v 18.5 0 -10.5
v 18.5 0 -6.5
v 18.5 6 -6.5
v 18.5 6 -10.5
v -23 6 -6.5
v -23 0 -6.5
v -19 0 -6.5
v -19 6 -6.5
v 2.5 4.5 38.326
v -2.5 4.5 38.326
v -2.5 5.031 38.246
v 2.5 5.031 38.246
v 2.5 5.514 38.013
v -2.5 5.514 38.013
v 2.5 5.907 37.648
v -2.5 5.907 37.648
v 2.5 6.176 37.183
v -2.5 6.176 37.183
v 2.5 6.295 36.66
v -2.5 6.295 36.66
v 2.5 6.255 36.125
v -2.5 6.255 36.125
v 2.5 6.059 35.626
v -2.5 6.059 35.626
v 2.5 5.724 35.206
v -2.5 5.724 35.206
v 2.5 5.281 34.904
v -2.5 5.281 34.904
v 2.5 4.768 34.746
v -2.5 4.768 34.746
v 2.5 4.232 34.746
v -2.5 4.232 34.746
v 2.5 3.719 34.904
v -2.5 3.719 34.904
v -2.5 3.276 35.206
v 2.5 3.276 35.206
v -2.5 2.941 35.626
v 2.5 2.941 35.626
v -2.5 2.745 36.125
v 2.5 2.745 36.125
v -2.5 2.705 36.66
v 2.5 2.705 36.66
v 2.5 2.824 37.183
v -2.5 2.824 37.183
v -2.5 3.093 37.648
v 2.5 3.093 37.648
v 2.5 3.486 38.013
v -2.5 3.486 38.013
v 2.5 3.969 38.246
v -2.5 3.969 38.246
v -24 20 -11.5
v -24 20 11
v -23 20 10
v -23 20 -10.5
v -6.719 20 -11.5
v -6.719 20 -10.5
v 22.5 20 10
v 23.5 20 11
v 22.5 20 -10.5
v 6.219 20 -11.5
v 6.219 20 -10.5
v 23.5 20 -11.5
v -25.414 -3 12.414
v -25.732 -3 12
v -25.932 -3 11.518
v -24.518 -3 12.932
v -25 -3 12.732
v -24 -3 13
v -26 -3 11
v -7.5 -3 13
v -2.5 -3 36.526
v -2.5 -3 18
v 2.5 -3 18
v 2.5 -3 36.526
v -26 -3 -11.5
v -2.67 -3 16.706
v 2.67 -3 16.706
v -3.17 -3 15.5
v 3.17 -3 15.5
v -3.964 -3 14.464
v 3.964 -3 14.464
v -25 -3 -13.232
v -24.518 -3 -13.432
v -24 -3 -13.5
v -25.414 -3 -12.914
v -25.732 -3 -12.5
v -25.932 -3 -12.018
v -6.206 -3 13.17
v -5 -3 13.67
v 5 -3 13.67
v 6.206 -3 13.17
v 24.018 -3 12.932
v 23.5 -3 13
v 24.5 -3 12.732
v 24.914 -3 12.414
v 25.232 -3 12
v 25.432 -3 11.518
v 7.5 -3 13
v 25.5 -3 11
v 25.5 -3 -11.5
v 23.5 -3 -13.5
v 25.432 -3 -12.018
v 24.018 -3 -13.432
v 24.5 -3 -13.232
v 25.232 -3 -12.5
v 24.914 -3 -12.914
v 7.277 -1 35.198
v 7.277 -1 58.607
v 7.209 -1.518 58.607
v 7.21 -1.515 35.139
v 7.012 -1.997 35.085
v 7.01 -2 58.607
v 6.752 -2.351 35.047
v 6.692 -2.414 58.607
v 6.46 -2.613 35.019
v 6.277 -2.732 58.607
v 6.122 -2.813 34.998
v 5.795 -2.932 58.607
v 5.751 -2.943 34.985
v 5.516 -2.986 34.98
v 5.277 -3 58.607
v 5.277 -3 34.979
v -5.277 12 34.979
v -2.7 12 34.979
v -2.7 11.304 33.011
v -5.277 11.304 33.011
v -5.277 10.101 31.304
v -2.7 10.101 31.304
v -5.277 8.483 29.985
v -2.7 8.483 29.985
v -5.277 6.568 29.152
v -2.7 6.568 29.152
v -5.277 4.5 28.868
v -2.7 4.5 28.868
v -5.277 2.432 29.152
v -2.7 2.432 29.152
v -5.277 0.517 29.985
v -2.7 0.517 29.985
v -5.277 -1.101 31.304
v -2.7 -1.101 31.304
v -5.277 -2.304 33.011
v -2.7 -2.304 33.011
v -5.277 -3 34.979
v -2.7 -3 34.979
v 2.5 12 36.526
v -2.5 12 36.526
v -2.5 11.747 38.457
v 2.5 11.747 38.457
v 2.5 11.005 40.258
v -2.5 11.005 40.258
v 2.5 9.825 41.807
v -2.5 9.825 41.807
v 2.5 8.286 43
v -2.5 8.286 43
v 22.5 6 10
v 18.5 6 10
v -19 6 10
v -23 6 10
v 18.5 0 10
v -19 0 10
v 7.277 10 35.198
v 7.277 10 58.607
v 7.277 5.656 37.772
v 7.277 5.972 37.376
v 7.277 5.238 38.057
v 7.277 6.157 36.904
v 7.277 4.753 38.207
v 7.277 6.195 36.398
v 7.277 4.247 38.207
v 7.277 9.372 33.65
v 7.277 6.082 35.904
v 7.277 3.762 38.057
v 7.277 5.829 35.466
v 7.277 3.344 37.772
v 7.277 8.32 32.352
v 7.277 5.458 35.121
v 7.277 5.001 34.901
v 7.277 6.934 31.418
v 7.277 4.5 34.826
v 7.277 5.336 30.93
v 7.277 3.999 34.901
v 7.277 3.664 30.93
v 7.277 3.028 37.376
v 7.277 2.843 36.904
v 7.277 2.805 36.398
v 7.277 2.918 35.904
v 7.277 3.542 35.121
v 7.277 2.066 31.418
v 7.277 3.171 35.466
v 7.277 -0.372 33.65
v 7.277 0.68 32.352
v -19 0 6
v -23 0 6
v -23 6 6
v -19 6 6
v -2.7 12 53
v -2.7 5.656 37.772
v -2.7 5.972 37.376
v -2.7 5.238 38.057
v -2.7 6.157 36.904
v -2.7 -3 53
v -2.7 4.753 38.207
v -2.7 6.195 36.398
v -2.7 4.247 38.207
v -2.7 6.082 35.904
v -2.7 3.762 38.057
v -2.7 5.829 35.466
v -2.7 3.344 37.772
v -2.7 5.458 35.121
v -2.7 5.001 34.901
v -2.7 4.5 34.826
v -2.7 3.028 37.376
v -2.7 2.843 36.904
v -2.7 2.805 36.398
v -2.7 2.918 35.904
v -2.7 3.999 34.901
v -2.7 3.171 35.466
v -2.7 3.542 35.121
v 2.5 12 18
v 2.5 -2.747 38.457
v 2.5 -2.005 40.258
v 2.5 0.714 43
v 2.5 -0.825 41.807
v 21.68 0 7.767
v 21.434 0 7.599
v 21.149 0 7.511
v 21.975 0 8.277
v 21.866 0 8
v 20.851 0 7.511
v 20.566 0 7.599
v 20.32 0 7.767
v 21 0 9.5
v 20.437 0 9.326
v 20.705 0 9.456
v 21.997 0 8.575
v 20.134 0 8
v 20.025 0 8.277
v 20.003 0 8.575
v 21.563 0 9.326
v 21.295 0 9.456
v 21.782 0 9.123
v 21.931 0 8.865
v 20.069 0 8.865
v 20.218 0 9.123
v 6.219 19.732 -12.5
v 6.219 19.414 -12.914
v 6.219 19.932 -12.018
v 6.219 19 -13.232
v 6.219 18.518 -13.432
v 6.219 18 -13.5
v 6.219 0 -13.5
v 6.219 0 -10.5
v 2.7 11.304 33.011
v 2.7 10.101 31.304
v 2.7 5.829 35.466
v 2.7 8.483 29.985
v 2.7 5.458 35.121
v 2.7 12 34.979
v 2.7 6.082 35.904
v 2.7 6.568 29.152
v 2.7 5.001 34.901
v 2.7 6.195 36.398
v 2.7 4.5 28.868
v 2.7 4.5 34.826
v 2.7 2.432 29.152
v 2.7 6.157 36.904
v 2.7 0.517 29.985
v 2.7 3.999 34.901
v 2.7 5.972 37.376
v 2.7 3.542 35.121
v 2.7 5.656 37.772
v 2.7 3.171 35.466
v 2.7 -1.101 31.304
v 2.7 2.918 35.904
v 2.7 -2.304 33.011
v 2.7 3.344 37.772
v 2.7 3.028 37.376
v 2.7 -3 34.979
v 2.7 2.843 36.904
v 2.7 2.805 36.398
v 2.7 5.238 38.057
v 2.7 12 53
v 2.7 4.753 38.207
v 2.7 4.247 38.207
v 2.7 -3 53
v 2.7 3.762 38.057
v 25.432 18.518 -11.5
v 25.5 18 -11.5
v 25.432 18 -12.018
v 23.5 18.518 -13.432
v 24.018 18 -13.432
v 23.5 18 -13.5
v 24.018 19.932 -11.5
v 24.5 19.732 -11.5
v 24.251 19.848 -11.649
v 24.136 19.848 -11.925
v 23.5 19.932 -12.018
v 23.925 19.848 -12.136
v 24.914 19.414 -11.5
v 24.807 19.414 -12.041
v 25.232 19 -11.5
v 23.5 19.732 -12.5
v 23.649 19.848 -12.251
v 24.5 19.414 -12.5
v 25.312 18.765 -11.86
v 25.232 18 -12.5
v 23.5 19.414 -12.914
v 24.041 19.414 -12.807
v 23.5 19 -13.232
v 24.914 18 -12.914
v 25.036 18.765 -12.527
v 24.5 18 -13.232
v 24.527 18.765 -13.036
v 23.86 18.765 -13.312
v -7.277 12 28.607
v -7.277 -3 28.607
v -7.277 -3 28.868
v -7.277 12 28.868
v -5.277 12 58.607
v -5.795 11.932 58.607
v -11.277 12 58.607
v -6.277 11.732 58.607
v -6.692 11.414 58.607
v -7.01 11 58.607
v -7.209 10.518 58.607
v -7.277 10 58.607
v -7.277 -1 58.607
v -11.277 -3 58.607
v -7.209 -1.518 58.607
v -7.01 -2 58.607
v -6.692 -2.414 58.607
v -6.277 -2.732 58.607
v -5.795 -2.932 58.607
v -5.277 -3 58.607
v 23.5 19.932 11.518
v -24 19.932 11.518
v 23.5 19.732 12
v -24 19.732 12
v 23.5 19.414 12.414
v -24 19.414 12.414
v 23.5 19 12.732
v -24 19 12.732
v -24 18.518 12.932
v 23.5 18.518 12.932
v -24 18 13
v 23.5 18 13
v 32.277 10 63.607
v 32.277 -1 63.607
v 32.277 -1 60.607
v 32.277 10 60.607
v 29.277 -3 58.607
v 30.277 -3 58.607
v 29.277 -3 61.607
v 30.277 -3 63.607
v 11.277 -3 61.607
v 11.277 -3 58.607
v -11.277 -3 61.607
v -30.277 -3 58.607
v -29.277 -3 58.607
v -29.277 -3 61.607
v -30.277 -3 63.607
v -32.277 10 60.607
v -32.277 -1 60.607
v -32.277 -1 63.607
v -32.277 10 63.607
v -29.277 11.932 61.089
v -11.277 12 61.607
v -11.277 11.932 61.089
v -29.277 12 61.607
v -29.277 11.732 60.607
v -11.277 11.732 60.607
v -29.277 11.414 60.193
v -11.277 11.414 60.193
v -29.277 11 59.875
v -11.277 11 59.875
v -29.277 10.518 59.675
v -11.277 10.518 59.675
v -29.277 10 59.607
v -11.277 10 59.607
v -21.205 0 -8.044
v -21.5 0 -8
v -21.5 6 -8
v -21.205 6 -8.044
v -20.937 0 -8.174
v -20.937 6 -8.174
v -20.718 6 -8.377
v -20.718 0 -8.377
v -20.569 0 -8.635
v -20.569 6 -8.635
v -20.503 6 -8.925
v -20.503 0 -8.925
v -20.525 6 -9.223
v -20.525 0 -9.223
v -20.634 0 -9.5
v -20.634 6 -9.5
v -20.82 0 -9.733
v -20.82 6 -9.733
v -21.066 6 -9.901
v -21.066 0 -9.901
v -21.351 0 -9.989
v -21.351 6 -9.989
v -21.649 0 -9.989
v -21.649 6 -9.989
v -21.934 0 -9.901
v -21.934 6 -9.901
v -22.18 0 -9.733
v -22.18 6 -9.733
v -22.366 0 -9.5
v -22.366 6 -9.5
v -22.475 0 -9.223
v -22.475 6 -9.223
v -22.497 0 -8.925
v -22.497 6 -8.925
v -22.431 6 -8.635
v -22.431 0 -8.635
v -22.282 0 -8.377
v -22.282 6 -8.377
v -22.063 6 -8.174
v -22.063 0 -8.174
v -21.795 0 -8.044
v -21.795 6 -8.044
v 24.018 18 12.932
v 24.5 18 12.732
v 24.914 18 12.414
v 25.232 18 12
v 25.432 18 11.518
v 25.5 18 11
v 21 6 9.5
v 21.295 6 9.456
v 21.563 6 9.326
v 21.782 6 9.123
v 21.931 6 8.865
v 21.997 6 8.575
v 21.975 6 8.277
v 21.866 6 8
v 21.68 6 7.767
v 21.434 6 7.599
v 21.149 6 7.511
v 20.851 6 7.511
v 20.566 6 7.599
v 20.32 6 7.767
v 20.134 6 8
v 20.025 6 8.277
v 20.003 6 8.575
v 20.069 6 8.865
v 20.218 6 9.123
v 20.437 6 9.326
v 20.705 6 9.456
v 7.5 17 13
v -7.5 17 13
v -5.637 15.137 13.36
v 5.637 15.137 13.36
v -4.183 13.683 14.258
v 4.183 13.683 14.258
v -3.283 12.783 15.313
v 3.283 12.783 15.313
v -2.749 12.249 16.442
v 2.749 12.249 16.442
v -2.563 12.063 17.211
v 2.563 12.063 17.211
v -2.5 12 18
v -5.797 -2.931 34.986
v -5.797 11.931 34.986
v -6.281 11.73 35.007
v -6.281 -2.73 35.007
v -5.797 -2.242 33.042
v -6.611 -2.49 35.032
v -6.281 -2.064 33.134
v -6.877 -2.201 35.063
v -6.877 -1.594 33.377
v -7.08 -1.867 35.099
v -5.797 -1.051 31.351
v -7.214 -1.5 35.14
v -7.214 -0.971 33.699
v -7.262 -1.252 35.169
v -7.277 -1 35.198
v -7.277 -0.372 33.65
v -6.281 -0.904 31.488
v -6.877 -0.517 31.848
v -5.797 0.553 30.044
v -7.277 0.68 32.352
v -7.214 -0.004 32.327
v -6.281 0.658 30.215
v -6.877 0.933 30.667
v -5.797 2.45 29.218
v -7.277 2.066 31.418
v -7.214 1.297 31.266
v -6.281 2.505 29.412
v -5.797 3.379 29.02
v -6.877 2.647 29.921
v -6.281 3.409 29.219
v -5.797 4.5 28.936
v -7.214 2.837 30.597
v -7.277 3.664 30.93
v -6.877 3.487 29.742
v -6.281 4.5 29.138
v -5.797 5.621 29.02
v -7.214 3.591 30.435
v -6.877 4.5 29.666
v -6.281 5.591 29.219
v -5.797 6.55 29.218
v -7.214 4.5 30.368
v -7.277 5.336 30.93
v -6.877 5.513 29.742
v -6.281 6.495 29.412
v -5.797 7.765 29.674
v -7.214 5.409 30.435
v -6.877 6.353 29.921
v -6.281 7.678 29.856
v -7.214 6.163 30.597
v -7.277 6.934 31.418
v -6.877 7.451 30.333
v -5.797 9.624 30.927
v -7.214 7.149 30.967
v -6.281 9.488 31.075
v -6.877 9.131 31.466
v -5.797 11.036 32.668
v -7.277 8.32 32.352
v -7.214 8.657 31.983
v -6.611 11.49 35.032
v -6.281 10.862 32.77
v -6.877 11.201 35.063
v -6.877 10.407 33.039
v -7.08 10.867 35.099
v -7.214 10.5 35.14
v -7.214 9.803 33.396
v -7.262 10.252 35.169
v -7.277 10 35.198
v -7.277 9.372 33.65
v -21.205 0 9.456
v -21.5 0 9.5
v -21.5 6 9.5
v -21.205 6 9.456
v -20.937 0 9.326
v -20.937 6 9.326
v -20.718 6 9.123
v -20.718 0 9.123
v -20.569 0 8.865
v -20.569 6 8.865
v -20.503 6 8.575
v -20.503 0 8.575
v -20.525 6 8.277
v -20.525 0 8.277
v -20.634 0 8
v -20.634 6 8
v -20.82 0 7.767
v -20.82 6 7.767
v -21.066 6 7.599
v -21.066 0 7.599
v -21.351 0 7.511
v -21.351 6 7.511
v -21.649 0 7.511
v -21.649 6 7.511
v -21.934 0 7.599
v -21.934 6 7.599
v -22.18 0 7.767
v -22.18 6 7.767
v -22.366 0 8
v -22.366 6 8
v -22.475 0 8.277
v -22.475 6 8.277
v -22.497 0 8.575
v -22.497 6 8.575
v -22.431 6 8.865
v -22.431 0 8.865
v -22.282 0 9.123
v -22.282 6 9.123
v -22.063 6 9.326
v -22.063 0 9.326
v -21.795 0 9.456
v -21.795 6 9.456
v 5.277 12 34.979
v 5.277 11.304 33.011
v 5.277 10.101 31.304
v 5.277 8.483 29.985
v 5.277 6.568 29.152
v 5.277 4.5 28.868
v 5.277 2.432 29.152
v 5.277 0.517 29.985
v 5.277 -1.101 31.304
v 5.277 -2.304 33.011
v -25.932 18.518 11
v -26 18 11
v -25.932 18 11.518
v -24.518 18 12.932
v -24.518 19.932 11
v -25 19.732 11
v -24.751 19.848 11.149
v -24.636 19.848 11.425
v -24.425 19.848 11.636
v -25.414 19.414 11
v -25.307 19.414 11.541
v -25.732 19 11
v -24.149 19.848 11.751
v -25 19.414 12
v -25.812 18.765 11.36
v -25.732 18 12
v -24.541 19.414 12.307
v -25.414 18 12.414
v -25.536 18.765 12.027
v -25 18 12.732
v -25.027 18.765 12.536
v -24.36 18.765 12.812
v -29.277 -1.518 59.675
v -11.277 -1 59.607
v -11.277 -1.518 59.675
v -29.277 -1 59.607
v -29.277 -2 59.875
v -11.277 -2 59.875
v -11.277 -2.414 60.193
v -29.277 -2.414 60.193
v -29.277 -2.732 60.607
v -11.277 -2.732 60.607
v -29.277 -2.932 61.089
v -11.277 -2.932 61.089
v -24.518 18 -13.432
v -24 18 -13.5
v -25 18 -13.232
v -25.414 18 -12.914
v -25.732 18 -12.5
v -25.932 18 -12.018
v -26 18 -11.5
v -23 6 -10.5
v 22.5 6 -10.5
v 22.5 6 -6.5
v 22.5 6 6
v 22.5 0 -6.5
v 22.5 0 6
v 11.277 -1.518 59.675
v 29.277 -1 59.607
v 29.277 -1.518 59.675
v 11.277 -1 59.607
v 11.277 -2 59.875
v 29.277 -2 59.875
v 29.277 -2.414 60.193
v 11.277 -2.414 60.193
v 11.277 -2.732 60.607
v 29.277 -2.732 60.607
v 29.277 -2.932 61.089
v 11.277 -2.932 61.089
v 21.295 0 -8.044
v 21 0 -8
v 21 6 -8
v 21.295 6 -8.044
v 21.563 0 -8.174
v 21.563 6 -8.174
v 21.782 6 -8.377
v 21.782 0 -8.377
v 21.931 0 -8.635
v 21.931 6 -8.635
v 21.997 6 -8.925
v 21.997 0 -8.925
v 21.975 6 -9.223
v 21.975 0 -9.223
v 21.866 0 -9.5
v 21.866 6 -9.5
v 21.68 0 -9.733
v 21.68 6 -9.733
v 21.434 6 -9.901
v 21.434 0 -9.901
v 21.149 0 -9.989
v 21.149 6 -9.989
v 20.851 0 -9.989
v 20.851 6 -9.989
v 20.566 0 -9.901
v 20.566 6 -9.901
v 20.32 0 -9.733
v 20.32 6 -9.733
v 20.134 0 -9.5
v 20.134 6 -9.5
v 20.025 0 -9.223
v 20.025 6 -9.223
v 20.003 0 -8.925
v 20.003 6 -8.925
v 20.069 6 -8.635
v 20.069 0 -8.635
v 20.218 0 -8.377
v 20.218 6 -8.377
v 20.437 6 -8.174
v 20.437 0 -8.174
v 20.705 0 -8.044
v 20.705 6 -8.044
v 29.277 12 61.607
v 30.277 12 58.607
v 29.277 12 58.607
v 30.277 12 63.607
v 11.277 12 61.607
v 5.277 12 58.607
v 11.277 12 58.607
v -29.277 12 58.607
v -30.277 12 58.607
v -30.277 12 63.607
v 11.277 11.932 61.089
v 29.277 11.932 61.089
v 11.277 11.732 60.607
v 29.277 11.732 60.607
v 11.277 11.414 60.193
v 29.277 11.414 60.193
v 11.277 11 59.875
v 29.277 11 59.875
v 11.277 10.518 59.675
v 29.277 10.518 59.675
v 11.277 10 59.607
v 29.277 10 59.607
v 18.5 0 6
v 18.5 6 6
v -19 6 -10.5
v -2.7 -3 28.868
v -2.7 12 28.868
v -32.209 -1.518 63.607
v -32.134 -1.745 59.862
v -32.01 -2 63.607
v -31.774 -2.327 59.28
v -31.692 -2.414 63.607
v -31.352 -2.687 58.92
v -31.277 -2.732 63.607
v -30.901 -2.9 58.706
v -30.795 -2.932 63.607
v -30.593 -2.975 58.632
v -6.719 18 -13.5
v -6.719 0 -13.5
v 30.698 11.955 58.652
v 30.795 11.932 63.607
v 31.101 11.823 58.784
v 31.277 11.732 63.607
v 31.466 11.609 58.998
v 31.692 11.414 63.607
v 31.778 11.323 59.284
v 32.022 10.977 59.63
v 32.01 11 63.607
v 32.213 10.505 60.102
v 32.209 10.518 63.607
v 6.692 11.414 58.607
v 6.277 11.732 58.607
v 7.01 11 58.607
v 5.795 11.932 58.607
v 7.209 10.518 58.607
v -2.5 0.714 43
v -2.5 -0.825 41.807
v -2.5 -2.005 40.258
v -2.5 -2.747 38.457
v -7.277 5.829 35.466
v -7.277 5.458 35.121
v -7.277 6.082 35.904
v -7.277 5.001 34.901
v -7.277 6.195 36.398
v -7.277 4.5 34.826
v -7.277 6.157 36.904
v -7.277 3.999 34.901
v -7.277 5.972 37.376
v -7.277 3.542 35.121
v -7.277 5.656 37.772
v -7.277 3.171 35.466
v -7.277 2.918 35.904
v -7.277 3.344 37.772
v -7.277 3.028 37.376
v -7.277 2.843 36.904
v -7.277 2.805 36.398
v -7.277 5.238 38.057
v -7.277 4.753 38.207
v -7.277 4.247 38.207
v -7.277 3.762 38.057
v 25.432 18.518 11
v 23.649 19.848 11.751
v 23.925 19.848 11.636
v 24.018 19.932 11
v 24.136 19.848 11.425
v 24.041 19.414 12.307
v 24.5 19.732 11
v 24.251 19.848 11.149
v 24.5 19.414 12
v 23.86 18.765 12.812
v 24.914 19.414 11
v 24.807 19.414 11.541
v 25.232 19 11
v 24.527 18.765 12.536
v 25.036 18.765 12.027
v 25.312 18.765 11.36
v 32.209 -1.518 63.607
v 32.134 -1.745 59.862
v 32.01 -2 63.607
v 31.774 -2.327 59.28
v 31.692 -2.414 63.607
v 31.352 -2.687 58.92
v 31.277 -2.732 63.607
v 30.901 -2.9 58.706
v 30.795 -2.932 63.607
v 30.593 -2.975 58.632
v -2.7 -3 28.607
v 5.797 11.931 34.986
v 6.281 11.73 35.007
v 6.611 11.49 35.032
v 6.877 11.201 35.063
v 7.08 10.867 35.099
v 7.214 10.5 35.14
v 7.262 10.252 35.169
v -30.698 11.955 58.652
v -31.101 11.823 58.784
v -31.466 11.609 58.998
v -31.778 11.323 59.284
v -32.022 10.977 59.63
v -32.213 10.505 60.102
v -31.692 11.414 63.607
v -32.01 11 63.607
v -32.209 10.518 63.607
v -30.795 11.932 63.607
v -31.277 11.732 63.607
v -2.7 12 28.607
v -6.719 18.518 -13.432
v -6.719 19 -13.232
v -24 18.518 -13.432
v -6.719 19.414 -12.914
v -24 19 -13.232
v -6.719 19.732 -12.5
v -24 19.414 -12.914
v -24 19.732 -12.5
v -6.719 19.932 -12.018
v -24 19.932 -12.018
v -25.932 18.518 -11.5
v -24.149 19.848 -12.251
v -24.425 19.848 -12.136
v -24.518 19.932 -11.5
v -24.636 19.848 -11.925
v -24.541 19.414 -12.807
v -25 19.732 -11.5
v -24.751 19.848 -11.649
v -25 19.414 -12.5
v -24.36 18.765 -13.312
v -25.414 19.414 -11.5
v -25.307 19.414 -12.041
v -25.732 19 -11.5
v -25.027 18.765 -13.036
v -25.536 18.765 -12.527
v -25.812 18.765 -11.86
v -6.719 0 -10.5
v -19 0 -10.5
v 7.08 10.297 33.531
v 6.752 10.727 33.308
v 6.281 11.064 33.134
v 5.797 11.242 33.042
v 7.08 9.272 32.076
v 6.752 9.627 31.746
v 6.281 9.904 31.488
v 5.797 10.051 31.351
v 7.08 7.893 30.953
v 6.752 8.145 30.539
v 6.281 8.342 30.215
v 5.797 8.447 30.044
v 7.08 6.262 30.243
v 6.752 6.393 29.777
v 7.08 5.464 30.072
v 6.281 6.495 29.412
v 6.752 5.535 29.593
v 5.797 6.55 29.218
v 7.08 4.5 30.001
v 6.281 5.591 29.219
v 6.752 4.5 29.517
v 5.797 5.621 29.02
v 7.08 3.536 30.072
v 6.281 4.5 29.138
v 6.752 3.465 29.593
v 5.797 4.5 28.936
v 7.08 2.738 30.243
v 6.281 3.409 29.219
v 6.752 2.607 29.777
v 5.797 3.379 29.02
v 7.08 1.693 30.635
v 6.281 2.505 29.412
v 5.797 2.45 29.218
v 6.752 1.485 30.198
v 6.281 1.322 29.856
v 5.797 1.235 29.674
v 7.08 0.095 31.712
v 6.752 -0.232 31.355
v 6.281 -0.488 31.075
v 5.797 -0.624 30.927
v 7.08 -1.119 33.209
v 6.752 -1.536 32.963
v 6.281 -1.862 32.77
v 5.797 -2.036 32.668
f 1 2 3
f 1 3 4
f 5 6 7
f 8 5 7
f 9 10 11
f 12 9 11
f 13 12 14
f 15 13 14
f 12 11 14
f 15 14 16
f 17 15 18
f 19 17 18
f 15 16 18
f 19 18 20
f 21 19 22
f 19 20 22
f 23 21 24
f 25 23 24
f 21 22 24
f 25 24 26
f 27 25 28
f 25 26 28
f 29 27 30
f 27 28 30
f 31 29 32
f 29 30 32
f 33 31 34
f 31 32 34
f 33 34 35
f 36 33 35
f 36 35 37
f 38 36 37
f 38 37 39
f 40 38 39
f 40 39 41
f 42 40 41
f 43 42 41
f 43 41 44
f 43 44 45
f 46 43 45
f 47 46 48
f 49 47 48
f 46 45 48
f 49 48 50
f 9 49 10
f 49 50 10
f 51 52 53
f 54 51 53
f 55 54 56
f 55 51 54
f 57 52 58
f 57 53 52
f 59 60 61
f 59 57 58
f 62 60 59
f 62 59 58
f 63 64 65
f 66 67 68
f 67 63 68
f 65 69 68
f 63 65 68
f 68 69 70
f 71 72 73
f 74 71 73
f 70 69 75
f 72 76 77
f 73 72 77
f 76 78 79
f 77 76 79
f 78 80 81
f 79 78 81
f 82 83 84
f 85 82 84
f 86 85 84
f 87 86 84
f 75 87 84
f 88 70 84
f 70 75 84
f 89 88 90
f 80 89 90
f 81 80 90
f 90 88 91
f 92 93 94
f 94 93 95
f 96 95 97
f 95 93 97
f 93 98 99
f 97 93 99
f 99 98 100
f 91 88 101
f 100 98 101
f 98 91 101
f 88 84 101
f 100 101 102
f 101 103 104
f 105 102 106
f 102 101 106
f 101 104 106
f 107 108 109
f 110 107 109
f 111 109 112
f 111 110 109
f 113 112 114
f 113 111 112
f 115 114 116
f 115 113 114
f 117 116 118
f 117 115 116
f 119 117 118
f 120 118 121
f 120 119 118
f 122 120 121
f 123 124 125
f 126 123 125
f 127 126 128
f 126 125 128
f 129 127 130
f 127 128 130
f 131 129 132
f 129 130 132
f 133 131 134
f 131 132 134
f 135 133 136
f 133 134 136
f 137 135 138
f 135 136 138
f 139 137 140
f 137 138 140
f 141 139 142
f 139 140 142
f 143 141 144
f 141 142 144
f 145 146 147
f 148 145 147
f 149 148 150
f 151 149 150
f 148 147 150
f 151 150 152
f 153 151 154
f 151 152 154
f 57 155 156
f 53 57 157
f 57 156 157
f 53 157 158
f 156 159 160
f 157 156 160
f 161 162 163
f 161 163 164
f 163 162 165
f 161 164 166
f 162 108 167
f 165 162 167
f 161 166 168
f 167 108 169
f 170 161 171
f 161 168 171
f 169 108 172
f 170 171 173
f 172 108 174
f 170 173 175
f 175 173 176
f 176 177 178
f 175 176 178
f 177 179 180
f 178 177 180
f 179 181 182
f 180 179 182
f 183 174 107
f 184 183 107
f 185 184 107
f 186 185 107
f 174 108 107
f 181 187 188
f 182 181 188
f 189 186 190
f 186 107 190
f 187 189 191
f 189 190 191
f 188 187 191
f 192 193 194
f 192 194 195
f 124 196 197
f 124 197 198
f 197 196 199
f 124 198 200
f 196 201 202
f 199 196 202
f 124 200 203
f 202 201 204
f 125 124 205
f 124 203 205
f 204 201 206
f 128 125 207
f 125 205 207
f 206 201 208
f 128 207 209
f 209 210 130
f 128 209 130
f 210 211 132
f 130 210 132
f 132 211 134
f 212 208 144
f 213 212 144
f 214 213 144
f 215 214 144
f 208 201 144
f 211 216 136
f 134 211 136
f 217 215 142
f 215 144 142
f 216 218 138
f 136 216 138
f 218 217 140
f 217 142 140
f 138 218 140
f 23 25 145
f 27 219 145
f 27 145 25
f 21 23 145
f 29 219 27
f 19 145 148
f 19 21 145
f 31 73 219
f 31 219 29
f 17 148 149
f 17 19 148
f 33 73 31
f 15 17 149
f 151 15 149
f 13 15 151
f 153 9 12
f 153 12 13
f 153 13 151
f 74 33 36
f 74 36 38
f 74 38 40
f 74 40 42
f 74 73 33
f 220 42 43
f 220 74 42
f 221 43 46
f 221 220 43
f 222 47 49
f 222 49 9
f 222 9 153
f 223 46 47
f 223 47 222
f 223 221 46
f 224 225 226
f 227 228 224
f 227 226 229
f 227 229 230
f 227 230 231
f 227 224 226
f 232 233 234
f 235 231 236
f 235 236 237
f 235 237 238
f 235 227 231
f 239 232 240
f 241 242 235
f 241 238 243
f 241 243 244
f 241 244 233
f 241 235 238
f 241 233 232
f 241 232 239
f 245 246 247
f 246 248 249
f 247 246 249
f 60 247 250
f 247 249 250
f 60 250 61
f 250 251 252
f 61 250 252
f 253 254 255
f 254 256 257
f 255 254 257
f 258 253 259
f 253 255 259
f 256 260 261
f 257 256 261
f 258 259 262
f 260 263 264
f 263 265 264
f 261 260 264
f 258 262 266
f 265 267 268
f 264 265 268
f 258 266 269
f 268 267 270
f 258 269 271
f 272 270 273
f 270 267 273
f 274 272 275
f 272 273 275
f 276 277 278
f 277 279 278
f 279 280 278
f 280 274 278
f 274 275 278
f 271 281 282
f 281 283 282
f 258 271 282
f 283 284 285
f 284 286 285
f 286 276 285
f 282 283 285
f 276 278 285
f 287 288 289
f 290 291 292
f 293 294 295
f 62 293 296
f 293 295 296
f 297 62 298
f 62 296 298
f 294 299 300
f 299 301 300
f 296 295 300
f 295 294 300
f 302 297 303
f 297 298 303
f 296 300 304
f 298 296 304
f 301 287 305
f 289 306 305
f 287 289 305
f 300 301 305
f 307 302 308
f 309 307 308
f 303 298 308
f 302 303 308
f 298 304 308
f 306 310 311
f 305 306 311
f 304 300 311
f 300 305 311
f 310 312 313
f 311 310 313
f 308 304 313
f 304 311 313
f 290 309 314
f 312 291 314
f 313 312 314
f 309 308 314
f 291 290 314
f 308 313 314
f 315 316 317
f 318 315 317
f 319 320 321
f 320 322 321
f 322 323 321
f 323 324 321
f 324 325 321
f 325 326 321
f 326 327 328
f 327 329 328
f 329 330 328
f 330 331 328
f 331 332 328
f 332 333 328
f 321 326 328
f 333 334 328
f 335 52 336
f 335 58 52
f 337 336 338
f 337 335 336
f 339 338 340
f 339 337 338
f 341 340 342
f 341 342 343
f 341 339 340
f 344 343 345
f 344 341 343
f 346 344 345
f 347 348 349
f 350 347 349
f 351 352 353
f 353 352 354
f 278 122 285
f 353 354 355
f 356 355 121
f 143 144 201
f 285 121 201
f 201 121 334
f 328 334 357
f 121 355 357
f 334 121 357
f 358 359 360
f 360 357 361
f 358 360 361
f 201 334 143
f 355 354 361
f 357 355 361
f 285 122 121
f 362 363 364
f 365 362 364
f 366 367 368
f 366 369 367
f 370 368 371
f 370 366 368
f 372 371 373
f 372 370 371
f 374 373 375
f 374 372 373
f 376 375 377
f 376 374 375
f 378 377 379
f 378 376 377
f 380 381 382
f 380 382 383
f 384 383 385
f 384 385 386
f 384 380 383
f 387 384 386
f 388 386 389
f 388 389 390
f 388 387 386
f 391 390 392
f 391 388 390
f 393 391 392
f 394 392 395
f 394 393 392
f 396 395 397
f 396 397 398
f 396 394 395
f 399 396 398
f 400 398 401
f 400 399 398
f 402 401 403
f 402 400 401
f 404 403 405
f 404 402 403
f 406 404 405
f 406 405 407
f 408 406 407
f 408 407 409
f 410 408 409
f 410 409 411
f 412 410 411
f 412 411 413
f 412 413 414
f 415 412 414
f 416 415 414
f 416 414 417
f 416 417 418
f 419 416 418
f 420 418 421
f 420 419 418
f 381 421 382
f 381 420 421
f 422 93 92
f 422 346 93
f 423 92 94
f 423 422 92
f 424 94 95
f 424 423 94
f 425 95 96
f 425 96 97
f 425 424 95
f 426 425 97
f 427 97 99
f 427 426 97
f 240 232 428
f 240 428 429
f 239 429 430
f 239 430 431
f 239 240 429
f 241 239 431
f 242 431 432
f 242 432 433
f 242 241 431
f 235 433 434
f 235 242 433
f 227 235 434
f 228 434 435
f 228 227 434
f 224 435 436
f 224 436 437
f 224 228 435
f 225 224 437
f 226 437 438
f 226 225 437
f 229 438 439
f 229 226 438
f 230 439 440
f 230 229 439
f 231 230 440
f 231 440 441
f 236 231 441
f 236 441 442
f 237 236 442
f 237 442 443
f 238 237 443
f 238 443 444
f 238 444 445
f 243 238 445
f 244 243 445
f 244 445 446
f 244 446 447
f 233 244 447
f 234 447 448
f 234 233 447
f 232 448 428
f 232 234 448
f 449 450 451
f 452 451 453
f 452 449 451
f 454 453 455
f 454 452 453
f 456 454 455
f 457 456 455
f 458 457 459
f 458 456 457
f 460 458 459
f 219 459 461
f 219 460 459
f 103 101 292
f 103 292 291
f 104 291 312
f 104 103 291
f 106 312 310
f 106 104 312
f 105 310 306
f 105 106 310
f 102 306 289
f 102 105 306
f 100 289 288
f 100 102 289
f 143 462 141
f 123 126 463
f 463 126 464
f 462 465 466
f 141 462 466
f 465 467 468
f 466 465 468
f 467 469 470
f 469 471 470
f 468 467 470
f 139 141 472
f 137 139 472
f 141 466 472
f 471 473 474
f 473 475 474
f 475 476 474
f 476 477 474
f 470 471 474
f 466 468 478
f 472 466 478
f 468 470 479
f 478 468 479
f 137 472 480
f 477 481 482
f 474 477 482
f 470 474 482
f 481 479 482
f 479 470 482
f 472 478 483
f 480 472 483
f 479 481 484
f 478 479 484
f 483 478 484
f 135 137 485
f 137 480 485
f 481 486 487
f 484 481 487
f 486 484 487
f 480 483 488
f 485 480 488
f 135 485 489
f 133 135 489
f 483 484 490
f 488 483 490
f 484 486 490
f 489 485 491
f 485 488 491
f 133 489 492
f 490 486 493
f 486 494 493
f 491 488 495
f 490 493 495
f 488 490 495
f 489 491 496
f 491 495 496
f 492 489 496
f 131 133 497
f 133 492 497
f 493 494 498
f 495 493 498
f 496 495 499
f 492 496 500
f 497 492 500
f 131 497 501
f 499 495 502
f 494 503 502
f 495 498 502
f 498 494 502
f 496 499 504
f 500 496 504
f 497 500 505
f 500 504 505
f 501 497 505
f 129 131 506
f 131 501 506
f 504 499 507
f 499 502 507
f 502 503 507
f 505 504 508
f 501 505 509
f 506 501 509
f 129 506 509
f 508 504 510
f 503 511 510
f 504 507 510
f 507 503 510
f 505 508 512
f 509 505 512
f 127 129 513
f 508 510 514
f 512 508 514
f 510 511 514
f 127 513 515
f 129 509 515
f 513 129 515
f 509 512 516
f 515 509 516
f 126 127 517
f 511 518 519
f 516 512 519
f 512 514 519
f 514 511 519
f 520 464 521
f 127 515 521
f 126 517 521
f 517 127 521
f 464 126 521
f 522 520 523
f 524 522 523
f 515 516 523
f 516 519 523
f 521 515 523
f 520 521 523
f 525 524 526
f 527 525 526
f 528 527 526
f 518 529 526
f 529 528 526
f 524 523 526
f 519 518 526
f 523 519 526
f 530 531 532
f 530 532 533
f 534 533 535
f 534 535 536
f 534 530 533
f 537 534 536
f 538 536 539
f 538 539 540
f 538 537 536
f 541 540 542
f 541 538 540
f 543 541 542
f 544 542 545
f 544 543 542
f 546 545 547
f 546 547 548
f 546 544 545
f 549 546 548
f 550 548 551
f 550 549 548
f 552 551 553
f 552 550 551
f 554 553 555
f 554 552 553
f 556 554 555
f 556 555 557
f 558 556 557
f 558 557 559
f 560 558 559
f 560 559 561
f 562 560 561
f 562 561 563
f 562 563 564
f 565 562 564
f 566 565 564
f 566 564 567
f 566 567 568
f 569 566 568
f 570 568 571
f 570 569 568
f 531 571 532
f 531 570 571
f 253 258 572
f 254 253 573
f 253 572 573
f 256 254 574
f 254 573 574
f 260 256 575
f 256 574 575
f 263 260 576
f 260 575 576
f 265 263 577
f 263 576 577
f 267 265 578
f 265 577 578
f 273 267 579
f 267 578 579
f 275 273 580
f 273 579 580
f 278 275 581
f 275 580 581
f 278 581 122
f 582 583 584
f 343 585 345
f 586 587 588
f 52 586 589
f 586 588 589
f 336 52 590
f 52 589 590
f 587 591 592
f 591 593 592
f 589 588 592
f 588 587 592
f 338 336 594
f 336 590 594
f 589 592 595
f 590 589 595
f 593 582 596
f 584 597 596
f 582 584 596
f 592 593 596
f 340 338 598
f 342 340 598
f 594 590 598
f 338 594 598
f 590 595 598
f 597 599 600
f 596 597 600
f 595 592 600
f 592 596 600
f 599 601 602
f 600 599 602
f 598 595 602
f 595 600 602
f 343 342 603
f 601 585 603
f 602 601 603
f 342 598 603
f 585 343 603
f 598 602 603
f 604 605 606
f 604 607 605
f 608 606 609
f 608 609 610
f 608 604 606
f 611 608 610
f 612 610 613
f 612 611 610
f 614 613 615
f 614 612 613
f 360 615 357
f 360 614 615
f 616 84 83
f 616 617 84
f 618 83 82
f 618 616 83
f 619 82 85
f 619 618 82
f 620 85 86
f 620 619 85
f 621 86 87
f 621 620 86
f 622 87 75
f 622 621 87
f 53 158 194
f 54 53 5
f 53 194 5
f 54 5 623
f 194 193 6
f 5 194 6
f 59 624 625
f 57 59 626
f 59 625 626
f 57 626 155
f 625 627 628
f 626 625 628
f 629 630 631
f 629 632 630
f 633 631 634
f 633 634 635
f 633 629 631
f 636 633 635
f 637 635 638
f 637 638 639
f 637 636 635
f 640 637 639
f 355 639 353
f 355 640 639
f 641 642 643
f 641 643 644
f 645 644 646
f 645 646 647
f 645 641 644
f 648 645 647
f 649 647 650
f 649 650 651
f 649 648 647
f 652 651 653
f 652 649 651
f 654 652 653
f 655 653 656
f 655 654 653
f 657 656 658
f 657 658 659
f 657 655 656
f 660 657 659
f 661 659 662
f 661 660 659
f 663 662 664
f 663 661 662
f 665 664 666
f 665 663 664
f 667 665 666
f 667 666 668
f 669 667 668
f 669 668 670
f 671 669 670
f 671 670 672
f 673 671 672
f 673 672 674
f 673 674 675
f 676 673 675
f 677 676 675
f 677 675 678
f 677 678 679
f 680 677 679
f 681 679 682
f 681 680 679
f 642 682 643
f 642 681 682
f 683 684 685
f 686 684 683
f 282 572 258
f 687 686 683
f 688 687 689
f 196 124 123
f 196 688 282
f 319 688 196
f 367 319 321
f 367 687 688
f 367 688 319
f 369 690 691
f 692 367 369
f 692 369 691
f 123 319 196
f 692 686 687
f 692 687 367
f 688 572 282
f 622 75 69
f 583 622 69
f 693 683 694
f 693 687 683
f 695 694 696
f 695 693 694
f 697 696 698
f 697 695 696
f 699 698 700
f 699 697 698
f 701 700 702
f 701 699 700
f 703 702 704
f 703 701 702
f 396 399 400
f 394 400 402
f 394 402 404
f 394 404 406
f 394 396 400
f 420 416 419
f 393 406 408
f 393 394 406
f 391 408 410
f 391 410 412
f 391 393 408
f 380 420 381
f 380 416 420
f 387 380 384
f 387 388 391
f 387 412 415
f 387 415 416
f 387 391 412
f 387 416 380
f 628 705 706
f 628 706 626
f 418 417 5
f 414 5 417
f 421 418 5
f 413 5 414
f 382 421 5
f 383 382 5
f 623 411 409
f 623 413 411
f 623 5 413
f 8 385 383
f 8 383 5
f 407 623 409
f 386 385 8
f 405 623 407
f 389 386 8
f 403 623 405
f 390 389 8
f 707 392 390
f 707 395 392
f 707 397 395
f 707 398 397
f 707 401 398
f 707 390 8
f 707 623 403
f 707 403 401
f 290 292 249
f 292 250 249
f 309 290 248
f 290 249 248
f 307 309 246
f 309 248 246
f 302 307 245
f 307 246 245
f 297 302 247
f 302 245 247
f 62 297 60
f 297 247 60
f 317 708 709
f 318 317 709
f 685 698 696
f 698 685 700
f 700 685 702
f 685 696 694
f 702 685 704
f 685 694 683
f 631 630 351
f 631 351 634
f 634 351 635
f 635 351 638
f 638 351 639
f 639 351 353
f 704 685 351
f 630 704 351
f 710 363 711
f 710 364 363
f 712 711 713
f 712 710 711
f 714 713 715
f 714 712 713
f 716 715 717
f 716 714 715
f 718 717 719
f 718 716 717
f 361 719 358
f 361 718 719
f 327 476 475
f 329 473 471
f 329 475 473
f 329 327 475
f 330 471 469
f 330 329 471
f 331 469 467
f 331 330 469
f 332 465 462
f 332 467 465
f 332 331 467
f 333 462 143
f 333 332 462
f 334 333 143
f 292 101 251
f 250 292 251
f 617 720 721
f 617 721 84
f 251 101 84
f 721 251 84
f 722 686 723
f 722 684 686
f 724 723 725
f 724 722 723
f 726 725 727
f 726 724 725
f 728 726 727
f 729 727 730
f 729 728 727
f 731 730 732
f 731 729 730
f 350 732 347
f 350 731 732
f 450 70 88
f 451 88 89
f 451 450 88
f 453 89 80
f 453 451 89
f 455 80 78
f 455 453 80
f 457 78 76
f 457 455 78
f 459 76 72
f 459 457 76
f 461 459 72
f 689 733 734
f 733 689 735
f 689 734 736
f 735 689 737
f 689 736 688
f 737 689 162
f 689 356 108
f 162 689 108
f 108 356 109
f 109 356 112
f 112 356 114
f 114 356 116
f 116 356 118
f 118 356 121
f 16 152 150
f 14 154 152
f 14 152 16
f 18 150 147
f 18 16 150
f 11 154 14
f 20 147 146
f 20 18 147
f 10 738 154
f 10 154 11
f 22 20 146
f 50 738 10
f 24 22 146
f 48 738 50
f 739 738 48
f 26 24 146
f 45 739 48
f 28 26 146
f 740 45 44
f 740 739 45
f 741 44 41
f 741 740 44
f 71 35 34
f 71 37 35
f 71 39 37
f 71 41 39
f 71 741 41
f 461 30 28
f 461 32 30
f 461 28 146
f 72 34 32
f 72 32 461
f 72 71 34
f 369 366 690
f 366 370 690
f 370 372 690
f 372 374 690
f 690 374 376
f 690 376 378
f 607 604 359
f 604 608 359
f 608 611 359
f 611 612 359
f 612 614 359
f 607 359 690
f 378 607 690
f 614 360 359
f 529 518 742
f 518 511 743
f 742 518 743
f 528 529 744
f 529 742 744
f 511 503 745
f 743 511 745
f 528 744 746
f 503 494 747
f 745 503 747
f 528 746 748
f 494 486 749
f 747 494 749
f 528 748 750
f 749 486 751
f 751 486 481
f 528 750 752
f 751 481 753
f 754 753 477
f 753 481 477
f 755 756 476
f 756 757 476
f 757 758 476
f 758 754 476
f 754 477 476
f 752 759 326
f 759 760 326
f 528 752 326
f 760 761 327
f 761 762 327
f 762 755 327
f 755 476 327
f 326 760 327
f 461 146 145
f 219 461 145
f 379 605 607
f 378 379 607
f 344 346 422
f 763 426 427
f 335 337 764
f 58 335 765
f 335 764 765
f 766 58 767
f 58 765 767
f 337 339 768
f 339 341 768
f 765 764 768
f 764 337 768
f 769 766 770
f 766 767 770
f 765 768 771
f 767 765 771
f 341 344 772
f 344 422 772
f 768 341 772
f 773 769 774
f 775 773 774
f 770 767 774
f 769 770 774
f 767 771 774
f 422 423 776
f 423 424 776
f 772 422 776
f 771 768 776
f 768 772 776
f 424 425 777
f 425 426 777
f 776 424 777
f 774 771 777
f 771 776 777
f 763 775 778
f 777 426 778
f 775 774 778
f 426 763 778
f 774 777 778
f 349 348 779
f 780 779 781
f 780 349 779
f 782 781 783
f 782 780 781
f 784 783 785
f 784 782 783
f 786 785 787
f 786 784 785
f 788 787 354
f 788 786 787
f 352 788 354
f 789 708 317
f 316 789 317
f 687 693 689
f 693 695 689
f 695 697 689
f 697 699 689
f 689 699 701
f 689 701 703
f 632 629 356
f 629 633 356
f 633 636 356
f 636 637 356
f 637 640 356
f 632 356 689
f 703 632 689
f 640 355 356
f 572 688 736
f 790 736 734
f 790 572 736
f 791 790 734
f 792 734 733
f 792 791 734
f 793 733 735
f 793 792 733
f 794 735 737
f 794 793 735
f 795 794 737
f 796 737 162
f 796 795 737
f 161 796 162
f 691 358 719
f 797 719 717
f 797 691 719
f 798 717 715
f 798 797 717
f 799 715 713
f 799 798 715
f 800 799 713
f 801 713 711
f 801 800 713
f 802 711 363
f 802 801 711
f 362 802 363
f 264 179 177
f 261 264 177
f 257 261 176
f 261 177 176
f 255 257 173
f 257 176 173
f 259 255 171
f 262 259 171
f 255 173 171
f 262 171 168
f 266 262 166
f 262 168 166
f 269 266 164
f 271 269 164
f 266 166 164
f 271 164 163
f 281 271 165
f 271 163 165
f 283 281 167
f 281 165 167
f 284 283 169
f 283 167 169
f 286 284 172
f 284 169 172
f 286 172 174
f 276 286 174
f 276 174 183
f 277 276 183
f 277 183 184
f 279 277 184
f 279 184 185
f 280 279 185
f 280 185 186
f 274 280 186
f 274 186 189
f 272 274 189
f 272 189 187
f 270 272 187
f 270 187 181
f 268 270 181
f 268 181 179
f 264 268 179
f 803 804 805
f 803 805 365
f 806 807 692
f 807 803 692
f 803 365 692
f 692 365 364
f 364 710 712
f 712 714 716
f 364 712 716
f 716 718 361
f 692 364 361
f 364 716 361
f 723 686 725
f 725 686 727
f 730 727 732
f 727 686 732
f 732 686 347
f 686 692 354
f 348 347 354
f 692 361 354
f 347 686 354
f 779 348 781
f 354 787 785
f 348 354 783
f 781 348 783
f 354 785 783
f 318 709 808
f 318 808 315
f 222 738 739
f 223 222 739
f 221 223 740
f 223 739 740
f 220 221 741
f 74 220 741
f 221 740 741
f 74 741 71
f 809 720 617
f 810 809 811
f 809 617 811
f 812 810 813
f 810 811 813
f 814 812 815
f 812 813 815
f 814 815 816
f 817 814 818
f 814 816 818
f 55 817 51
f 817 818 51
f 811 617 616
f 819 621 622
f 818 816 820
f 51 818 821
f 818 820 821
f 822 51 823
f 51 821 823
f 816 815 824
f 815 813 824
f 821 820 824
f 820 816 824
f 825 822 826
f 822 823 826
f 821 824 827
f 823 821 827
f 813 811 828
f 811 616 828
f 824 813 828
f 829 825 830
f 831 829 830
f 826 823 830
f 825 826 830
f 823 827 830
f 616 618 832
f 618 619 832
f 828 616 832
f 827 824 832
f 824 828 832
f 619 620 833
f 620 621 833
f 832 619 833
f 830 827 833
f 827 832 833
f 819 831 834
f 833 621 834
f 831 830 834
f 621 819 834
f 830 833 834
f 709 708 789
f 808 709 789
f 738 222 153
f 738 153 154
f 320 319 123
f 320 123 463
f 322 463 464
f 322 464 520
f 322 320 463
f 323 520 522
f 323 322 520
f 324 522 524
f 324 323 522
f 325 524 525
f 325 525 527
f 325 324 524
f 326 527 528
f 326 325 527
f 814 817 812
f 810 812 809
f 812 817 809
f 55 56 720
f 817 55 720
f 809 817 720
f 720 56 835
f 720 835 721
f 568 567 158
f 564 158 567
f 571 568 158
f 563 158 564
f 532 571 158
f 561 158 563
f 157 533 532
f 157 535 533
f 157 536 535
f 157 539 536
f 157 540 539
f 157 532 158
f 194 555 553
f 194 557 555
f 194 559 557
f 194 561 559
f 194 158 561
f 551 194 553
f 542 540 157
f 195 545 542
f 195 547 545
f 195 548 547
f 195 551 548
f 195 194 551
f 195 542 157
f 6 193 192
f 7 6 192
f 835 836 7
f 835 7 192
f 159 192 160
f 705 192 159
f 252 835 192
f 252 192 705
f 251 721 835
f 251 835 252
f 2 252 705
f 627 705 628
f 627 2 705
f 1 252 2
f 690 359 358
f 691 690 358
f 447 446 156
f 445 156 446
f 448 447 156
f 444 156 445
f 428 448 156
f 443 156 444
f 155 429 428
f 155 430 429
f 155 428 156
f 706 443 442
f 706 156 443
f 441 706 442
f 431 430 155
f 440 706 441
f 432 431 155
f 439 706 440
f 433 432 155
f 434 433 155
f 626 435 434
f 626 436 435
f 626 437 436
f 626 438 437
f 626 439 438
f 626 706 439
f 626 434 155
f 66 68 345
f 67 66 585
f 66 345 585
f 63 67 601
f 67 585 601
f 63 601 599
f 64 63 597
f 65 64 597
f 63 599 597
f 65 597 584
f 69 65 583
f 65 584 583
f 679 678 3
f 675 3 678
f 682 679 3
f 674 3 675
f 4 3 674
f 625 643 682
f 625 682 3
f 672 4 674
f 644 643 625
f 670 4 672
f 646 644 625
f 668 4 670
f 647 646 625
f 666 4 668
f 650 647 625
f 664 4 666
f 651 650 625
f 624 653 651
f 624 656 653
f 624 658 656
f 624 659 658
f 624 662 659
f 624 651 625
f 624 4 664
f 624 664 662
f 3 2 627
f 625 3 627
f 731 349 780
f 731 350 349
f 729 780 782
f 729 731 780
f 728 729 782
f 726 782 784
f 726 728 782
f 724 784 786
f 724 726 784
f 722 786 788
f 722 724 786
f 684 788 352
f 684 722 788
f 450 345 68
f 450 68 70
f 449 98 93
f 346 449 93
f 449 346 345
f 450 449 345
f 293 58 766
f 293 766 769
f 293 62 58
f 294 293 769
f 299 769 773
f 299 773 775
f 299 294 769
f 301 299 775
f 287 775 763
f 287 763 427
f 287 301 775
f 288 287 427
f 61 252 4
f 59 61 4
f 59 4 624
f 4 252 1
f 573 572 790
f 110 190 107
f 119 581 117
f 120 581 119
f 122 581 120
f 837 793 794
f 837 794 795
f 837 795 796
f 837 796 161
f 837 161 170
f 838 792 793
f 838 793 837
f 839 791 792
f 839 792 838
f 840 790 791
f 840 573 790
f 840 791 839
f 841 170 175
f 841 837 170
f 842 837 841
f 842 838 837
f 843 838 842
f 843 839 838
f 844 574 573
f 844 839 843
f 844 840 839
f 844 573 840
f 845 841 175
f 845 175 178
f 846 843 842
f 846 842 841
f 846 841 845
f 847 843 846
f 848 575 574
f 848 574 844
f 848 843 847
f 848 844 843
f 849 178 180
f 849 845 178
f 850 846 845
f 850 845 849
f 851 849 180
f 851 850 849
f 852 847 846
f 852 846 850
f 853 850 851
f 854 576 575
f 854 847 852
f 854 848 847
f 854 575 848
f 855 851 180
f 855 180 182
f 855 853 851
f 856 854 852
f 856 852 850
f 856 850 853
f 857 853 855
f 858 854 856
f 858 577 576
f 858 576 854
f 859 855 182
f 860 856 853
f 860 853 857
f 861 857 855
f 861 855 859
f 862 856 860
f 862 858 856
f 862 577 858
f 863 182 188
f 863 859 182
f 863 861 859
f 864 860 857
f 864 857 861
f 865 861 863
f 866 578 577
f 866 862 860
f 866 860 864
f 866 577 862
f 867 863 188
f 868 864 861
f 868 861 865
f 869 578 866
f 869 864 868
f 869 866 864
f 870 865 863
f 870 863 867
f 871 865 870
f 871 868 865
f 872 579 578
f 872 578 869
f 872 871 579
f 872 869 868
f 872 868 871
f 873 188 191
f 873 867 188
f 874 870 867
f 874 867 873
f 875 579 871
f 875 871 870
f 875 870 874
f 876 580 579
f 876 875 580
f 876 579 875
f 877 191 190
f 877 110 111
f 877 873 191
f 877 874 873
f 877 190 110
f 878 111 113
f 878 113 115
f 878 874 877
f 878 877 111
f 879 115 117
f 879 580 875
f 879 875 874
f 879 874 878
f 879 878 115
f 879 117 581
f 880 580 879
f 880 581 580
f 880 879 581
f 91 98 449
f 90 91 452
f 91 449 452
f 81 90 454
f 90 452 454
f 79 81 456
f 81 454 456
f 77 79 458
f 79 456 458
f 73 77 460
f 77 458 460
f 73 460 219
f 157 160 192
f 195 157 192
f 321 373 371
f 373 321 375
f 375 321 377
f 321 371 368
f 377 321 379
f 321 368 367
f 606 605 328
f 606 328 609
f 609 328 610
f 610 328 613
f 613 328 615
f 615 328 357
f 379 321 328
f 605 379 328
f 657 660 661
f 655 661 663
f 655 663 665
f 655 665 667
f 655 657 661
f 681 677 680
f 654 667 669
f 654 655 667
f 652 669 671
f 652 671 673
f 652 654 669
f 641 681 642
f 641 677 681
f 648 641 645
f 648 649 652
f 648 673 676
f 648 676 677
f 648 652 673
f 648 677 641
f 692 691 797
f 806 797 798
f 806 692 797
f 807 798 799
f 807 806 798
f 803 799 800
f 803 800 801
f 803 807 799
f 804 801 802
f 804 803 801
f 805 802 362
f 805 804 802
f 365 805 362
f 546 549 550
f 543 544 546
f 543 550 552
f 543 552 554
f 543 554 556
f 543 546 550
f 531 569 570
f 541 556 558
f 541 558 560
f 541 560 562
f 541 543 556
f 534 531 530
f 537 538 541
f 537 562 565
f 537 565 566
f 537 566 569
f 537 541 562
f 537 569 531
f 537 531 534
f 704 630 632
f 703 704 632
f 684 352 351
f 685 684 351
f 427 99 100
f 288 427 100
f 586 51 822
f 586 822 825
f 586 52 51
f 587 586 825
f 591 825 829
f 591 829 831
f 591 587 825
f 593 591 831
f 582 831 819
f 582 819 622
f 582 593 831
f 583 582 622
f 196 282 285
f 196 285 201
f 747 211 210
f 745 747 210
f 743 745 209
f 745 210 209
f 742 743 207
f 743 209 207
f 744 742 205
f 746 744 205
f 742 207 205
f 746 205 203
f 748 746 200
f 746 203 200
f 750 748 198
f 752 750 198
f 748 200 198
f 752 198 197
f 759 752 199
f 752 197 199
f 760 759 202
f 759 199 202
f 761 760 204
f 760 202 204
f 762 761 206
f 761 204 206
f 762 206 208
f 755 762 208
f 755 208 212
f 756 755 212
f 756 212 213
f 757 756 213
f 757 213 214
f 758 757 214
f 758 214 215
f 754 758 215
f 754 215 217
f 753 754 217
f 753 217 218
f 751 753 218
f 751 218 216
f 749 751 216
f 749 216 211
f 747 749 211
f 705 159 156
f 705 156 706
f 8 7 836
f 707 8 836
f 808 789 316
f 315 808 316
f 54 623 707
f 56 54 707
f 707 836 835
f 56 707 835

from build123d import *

# Parameters (mm, degrees)
EXTRUDE_1_DEPTH     = 20
SKETCH_1_3_W        = 4
SKETCH_1_3_H        = 4
SKETCH_1_3_R        = 1
EXTRUDE_2_DEPTH     = 6
SKETCH_1_4_W        = 51.5
SKETCH_1_4_H        = 26.5
EXTRUDE_3_DEPTH     = 3
FILLET_1_R          = 2
EXTRUDE_4_DEPTH     = 15
SKETCH_4_R          = 1.8
CUT_EXTRUDE_1_DEPTH = 5
FILLET_2_R          = 5
EXTRUDE_5_DEPTH     = 15
SKETCH_6_R          = 1.7
CUT_EXTRUDE_2_DEPTH = 15
FILLET_3_R          = 2


with BuildPart() as part:
    # Эскиз1 → Бобышка-Вытянуть1 (new body)
    with BuildSketch(Plane(origin=(0, 0, 0), x_dir=(1, 0, 0), z_dir=(0, 1, 0))):
        Polygon((-23, 6.5), (-23, 10.5), (-19, 10.5), (-6.718518259, 10.5), (-6.718518259, 13.5), (-26, 13.5), (-26, -13), (25.5, -13), (25.5, 13.5), (6.218518259, 13.5), (6.218518259, 10.5), (18.5, 10.5), (22.5, 10.5), (22.5, 6.5), (22.5, -6), (22.5, -10), (18.5, -10), (-19, -10), (-23, -10), (-23, -6), align=None)
    extrude(amount=EXTRUDE_1_DEPTH)

    # Эскиз1<3> → Бобышка-Вытянуть2 (add)
    # profile 1 of 4: a face of its own
    with BuildSketch(Plane(origin=(0, 0, 0), x_dir=(1, 0, 0), z_dir=(0, 1, 0))):
        with Locations((-21, 8.5)):
            Rectangle(SKETCH_1_3_W, SKETCH_1_3_H)
        with Locations((-21.5, 9)):
            Circle(SKETCH_1_3_R, mode=Mode.SUBTRACT)
    # profile 2 of 4: a face of its own
    with BuildSketch(Plane(origin=(0, 0, 0), x_dir=(1, 0, 0), z_dir=(0, 1, 0))):
        with Locations((-21, -8)):
            Rectangle(SKETCH_1_3_W, SKETCH_1_3_H)
        with Locations((-21.5, -8.5)):
            Circle(SKETCH_1_3_R, mode=Mode.SUBTRACT)
    # profile 3 of 4: a face of its own
    with BuildSketch(Plane(origin=(0, 0, 0), x_dir=(1, 0, 0), z_dir=(0, 1, 0))):
        with Locations((20.5, 8.5)):
            Rectangle(SKETCH_1_3_W, SKETCH_1_3_H)
        with Locations((21, 9)):
            Circle(SKETCH_1_3_R, mode=Mode.SUBTRACT)
    # profile 4 of 4: a face of its own
    with BuildSketch(Plane(origin=(0, 0, 0), x_dir=(1, 0, 0), z_dir=(0, 1, 0))):
        with Locations((20.5, -8)):
            Rectangle(SKETCH_1_3_W, SKETCH_1_3_H)
        with Locations((21, -8.5)):
            Circle(SKETCH_1_3_R, mode=Mode.SUBTRACT)
    extrude(amount=EXTRUDE_2_DEPTH)

    # Эскиз1<4> → Бобышка-Вытянуть3 (add)
    with BuildSketch(Plane(origin=(0, 0, 0), x_dir=(1, 0, 0), z_dir=(0, 1, 0))):
        with Locations((-0.25, 0.25)):
            Rectangle(SKETCH_1_4_W, SKETCH_1_4_H)
    extrude(amount=-EXTRUDE_3_DEPTH)

    # Скругление1
    fillet_1_edges = [part.edges().sort_by_distance(p)[0] for p in [
        (-26, 20, -0.25),
        (-16.359259129, 20, -13.5),
        (15.859259129, 20, -13.5),
        (25.5, 20, -0.25),
        (-0.25, 20, 13),
        (-26, 8.5, 13),
        (-26, 8.5, -13.5),
        (25.5, 8.5, -13.5),
        (25.5, 8.5, 13),
    ]]
    fillet(fillet_1_edges, radius=FILLET_1_R)

    # Эскиз3 → Бобышка-Вытянуть4 (add)
    with BuildSketch(Plane.XZ.offset(3)):
        Polygon((2.5, 13), (2.5, 43), (0, 43), (-2.5, 43), (-2.5, 13), align=None)
    extrude(amount=-EXTRUDE_4_DEPTH)

    # Эскиз4 → Вырез-Вытянуть1 (cut)
    with BuildSketch(Plane.ZY.offset(2.5)):
        with Locations((36.52553923, 4.5)):
            Circle(SKETCH_4_R)
        with BuildLine():
            ThreePointArc((36.52553923, 12), (40.257657608, 11.00548172), (43, 8.285677977))
            Line((43, 8.285677977), (43, 12))
            Line((43, 12), (36.52553923, 12))
        make_face()
        with BuildLine():
            Line((43, -3), (43, 0.714322023))
            ThreePointArc((43, 0.714322023), (40.257657608, -2.00548172), (36.52553923, -3))
            Line((36.52553923, -3), (43, -3))
        make_face()
    extrude(amount=-CUT_EXTRUDE_1_DEPTH, mode=Mode.SUBTRACT)

    # Скругление2
    fillet_2_edges = [part.edges().sort_by_distance(p)[0] for p in [
        (0, 12, 13),
        (2.5, 4.5, 13),
        (-2.5, 4.5, 13),
    ]]
    fillet(fillet_2_edges, radius=FILLET_2_R)


with BuildPart() as body_2:
    # Эскиз5 → Бобышка-Вытянуть5 (new body)
    with BuildSketch(Plane.XZ.offset(3)):
        Polygon((2.7, 53), (-2.7, 53), (-2.7, 28.606863908), (-7.277487258, 28.606863908), (-7.277487258, 58.606863908), (-11.277487258, 58.606863908), (-11.277487258, 59.606863908), (-29.277487258, 59.606863908), (-29.277487258, 58.606863908), (-32.277487258, 58.606863908), (-32.277487258, 63.606863908), (32.277487258, 63.606863908), (32.277487258, 58.606863908), (29.277487258, 58.606863908), (29.277487258, 59.606863908), (11.277487258, 59.606863908), (11.277487258, 58.606863908), (7.277487258, 58.606863908), (7.277487258, 28.867707957), (2.7, 28.867707957), align=None)
    extrude(amount=-EXTRUDE_5_DEPTH)

    # Эскиз6 → Вырез-Вытянуть2 (cut)
    with BuildSketch(Plane(origin=(7.277487258, 0, 0), x_dir=(0, 0, -1), z_dir=(1, 0, 0))):
        with Locations((-36.52553923, 4.5)):
            Circle(SKETCH_6_R)
        with BuildLine():
            ThreePointArc((-34.978807252, 12), (-30.588915934, 9.337239259), (-28.867707957, 4.5))
            Line((-28.867707957, 4.5), (-28.867707957, 12))
            Line((-28.867707957, 12), (-34.978807252, 12))
        make_face()
        with BuildLine():
            Line((-28.867707957, -3), (-28.867707957, 4.5))
            ThreePointArc((-28.867707957, 4.5), (-30.588915934, -0.337239259), (-34.978807252, -3))
            Line((-34.978807252, -3), (-28.867707957, -3))
        make_face()
    extrude(amount=-CUT_EXTRUDE_2_DEPTH, mode=Mode.SUBTRACT)


with BuildPart() as cut_extrude_2_piece_1:
    # of the separate pieces the step leaves, piece 1, a body of its own (cut_extrude_2_pieces)
    add(body_2.part.solids().sort_by_distance((2.7, -3, 53))[0])

    # Скругление3
    fillet_3_edges = [cut_extrude_2_piece_1.edges().sort_by_distance(p)[0] for p in [
        (32.277487258, 12, 61.106863908),
        (-32.277487258, 12, 61.106863908),
        (-32.277487258, -3, 61.106863908),
        (32.277487258, -3, 61.106863908),
        (20.277487258, -3, 59.606863908),
        (20.277487258, 12, 59.606863908),
        (-20.277487258, 12, 59.606863908),
        (-20.277487258, -3, 59.606863908),
        (-32.277487258, 4.5, 58.606863908),
        (32.277487258, 4.5, 58.606863908),
        (-7.277487258, 9.337239259, 30.588915934),
        (7.277487258, 4.5, 28.867707957),
        (-7.277487258, -3, 46.79283558),
        (7.277487258, -3, 46.79283558),
        (-7.277487258, 12, 46.79283558),
        (7.277487258, 12, 46.79283558),
    ]]
    fillet(fillet_3_edges, radius=FILLET_3_R)


with BuildPart() as cut_extrude_2_piece_2:
    # of the separate pieces the step leaves, piece 2, a body of its own (cut_extrude_2_pieces)
    add(body_2.part.solids().sort_by_distance((-2.7, -3, 28.867707957))[0])


solid = Compound([part.part, cut_extrude_2_piece_1.part, cut_extrude_2_piece_2.part])
